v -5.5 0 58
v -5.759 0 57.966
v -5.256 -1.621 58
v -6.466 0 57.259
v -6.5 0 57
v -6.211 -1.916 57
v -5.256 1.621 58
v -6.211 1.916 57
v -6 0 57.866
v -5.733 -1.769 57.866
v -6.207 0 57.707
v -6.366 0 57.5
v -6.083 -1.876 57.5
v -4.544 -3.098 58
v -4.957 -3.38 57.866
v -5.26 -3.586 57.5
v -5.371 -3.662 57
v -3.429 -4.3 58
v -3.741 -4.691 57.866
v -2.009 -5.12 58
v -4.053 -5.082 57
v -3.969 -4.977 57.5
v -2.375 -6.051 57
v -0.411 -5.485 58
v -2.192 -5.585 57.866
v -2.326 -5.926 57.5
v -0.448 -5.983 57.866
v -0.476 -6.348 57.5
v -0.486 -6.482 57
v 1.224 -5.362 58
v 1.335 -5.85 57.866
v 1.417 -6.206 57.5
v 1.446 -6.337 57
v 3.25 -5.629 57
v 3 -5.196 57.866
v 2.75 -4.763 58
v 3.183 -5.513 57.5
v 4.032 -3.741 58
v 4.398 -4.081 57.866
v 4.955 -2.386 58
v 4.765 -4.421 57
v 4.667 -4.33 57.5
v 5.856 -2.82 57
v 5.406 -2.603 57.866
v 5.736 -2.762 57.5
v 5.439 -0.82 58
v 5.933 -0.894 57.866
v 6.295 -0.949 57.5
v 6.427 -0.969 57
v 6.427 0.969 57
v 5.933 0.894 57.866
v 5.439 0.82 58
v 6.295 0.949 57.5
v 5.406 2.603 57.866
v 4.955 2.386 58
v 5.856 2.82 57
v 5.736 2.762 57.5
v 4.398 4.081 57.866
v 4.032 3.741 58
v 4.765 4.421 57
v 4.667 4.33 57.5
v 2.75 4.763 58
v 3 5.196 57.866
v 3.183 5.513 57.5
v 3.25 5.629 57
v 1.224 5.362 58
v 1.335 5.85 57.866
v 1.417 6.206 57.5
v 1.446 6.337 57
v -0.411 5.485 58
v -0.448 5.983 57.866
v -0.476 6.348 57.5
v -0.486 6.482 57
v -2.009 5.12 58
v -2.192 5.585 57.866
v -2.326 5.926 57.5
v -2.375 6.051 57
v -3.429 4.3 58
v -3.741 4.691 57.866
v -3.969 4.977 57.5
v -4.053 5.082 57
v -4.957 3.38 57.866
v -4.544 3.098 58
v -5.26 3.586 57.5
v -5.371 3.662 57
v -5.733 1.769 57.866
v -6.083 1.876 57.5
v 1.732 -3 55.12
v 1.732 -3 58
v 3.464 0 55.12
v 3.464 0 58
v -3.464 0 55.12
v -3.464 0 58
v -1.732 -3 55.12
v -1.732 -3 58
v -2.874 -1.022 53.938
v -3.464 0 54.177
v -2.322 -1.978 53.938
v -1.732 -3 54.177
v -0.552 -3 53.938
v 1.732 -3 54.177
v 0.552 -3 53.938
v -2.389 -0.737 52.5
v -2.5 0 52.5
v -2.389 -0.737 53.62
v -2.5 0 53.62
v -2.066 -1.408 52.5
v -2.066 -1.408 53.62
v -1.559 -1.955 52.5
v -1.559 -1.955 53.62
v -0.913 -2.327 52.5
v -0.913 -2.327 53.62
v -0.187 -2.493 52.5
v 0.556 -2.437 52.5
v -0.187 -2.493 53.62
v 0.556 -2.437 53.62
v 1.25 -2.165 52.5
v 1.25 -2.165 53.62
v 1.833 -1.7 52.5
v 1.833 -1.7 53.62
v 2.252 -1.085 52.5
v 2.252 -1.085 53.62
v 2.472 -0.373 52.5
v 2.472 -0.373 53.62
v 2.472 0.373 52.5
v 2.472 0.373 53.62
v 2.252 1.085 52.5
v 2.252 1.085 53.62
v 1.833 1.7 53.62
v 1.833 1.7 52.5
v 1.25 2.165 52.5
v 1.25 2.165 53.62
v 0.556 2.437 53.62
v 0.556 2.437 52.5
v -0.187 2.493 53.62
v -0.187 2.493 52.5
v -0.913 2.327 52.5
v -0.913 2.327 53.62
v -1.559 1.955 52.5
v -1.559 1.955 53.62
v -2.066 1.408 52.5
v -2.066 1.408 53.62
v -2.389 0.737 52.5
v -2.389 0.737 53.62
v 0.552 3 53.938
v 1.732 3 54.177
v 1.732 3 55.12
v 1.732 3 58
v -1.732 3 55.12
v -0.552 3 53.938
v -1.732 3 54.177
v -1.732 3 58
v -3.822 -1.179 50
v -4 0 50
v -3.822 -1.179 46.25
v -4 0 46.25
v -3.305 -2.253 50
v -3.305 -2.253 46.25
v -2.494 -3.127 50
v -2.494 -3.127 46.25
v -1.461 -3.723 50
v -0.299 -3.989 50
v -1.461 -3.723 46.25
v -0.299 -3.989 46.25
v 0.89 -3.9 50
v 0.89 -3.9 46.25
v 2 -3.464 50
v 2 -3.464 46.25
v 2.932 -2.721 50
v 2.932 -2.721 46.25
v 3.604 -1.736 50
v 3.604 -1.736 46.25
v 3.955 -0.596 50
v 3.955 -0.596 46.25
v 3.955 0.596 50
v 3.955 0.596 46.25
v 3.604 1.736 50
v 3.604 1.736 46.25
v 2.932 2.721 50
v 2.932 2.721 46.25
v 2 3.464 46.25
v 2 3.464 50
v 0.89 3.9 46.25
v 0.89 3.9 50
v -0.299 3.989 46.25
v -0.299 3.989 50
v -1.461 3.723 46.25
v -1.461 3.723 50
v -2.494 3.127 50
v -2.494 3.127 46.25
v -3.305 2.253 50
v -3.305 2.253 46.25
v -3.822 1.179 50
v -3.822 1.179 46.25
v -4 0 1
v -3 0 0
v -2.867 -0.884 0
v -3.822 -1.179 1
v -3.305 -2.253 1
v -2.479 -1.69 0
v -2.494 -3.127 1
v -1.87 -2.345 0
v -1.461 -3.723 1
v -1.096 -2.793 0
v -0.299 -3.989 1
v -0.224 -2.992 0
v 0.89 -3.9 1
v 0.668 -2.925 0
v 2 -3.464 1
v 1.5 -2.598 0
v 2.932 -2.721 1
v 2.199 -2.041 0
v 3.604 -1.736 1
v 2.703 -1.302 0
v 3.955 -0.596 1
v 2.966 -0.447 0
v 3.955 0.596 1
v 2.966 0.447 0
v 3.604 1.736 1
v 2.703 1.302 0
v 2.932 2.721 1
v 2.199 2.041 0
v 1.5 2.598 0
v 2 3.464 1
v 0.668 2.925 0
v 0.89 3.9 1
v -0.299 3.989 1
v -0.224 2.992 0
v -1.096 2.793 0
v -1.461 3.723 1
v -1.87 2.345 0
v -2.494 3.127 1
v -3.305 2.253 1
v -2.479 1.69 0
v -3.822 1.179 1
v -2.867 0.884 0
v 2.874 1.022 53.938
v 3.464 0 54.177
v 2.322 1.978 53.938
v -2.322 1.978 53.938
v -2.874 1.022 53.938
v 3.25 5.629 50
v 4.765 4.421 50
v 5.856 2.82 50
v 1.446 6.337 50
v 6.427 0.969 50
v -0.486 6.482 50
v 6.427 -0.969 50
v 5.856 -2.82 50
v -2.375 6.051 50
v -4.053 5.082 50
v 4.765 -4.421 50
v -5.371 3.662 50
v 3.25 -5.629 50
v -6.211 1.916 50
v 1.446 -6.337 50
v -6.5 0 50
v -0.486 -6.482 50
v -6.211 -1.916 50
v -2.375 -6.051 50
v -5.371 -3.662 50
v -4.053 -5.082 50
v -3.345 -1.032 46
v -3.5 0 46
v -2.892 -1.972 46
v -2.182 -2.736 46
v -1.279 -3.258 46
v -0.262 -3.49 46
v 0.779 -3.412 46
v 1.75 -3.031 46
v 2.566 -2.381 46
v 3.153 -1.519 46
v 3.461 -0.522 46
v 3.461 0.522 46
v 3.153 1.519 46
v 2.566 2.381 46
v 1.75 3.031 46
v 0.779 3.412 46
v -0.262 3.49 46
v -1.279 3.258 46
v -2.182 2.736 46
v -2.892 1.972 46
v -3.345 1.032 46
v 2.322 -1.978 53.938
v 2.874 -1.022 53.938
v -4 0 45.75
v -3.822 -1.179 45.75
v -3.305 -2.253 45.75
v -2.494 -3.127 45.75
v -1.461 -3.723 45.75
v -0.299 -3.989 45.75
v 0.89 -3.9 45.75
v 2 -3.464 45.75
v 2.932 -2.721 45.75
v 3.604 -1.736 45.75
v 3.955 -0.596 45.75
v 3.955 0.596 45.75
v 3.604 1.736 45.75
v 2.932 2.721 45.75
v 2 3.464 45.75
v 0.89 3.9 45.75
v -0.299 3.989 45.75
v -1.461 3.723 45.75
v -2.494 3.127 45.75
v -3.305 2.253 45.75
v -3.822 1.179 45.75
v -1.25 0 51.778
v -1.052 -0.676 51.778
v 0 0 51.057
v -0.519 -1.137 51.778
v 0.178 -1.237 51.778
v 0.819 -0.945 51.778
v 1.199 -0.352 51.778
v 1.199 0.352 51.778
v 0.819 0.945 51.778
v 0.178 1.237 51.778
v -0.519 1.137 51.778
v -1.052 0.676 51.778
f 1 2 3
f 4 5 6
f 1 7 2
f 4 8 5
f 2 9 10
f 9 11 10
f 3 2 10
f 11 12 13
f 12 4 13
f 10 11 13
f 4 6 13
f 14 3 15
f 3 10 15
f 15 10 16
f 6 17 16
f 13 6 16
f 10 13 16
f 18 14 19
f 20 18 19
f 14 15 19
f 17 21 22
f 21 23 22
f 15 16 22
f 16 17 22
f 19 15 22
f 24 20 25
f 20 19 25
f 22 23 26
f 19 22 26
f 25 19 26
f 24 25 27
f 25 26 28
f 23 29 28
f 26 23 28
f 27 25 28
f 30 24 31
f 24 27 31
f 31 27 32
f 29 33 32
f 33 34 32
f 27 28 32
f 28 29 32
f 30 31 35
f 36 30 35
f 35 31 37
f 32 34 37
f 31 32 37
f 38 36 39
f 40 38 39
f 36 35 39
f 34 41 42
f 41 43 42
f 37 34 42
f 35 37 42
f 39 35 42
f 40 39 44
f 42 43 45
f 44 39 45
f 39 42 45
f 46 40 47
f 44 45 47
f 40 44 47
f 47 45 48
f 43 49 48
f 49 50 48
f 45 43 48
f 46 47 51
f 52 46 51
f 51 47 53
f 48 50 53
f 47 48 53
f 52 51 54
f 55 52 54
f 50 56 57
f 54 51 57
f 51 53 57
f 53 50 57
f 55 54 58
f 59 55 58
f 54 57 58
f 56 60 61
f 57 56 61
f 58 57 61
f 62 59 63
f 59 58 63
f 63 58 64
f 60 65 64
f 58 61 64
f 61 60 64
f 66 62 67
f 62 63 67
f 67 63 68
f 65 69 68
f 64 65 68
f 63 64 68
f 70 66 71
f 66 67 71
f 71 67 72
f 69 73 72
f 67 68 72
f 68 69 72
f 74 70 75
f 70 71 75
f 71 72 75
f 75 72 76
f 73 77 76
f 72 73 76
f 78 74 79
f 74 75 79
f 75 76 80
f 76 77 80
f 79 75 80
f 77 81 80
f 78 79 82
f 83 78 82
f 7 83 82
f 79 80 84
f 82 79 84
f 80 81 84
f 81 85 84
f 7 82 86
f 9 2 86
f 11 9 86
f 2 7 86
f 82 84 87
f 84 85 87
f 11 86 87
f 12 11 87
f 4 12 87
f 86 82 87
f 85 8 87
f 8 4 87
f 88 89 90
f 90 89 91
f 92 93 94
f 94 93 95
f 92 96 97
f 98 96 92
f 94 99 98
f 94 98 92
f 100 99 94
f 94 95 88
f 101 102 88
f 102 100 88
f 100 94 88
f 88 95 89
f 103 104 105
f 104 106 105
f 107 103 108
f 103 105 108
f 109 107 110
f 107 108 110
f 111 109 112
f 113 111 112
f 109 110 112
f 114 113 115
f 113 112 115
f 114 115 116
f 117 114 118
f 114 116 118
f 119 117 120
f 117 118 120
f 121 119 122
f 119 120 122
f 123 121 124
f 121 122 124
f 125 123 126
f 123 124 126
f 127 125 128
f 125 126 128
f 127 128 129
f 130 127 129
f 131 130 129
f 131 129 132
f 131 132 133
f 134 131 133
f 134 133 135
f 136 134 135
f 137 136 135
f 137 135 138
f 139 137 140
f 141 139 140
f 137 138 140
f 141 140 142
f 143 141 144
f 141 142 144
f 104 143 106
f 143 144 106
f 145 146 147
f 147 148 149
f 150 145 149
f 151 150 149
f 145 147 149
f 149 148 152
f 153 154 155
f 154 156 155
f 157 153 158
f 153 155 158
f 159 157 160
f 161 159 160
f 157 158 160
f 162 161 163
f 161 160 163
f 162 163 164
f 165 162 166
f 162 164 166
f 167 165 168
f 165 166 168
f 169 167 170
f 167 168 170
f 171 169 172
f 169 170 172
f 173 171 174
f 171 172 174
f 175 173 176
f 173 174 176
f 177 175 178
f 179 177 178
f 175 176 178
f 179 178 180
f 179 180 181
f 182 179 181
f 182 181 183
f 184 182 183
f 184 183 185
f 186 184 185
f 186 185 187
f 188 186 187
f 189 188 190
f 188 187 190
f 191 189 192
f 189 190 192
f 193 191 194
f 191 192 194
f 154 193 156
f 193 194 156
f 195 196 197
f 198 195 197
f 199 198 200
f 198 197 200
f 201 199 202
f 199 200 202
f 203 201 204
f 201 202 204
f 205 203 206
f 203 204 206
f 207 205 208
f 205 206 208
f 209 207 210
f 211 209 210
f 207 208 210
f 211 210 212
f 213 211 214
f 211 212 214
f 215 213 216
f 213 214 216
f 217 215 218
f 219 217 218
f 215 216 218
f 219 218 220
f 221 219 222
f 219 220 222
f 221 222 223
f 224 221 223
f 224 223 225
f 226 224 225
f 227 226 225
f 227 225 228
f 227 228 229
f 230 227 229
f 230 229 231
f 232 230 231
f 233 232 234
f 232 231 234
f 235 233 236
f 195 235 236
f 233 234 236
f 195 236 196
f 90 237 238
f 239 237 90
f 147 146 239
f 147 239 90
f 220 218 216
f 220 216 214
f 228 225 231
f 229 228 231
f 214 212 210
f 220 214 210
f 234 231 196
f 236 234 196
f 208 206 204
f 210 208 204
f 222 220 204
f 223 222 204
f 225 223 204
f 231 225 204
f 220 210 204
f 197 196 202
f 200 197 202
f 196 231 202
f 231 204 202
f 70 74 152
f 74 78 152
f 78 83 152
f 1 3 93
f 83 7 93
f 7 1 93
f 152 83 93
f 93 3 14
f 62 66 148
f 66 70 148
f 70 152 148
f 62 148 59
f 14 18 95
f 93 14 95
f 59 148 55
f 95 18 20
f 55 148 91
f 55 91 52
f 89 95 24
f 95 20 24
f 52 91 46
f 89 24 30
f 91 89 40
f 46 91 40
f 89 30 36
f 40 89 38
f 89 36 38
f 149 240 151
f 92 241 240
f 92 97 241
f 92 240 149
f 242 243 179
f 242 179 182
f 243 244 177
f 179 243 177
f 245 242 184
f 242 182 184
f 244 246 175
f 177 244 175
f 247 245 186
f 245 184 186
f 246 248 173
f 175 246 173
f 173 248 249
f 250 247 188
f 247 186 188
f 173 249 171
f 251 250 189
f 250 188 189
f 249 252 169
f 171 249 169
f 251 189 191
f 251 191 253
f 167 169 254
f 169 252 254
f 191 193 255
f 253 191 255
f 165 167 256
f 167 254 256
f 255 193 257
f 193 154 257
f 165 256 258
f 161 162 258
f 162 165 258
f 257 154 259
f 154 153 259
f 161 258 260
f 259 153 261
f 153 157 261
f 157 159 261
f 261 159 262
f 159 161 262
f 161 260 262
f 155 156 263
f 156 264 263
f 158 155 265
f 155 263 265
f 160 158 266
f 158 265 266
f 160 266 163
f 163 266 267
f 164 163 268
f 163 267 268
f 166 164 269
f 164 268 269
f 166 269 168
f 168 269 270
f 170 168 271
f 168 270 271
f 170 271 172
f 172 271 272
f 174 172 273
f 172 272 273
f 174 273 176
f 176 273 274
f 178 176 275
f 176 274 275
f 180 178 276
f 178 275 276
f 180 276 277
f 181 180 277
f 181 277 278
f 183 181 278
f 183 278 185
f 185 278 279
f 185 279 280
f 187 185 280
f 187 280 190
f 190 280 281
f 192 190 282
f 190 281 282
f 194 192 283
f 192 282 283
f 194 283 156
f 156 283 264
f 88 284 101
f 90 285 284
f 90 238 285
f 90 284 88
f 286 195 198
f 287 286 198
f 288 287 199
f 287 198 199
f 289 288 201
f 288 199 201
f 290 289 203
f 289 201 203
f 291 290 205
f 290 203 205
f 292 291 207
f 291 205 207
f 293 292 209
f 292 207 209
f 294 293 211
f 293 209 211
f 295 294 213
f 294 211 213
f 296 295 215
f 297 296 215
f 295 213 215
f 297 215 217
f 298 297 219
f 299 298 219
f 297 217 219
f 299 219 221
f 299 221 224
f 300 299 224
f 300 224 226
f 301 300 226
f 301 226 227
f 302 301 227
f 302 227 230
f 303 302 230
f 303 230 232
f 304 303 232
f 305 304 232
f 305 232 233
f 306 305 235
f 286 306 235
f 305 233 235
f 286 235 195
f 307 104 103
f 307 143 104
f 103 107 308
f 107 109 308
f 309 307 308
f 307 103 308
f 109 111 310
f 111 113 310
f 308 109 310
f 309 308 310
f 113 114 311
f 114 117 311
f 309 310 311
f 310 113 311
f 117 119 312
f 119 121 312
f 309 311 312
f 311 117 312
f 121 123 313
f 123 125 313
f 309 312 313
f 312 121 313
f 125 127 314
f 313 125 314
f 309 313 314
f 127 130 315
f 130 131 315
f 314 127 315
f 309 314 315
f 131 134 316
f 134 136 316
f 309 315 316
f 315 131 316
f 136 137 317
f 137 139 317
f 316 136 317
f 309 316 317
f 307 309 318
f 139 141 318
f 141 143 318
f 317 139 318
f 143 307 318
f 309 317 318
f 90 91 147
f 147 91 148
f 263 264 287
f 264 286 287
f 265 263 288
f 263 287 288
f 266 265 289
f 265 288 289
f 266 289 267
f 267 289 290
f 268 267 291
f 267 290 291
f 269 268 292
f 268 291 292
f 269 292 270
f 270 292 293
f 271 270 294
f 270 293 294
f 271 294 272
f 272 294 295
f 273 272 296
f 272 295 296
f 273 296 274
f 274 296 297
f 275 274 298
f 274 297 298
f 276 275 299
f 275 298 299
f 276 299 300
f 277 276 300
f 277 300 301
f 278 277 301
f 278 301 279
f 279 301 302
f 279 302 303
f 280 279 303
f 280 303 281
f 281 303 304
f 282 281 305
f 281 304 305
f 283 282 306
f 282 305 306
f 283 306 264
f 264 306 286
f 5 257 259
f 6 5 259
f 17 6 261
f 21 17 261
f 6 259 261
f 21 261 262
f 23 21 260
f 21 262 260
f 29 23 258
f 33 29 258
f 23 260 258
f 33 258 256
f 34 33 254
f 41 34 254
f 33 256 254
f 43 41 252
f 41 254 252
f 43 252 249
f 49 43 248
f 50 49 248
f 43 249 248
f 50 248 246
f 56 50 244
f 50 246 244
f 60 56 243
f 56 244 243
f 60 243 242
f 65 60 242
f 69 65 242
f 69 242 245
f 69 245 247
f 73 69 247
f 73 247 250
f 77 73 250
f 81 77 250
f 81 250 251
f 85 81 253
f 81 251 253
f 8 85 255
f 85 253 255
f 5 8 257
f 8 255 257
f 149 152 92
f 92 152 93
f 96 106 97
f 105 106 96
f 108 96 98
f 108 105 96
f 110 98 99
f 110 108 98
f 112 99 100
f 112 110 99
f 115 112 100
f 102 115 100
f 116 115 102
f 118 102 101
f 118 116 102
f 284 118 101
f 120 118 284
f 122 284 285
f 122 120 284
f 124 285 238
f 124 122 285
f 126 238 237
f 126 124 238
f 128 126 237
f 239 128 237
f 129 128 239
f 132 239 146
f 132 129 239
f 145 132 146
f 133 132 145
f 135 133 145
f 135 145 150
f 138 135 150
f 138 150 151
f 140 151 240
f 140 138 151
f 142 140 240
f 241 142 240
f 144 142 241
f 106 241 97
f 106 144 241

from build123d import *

# Parameters (mm, degrees)
F2_R     = 1
F3_SIZE  = 1
F5_DEPTH = 2.88


# Not quite as in the source:
# - a fillet or chamfer that OpenCascade refuses, or shapes differently, is made with other operations: its cross-section is extruded or revolved along the edge and cut away or added


with BuildPart() as f1:
    # F0 (on Front) → F1 (revolve)
    with BuildSketch(Plane.XZ):
        Polygon((-4, 0), (0, 0), (0, 51.056624327), (-2.5, 52.5), (-2.5, 58), (-6.5, 58), (-6.5, 50), (-4, 50), (-4, 46.25), (-3.5, 46), (-4, 45.75), align=None)
    revolve(axis=Axis((0, 0, 18.332445994), (0, 0, 1)))

    # F2
    f2_edges = [f1.edges().sort_by_distance(p)[0] for p in [
        (6.5, 0, 58),
    ]]
    fillet(f2_edges, radius=F2_R)

    # F3
    f3_edges = [f1.edges().sort_by_distance(p)[0] for p in [
        (4, 0, 0),
    ]]
    chamfer(f3_edges, length=F3_SIZE)

    # F4 (on face) → F5 (cut)
    with BuildSketch(Plane.XY.offset(58)):
        Polygon((-1.7320508076, -3), (1.7320508076, -3), (3.4641016151, 0), (1.7320508076, 3), (-1.7320508076, 3), (-3.4641016151, 0), align=None)
    extrude(amount=-F5_DEPTH, mode=Mode.SUBTRACT)

    # F6: chamfer of 1.5 x 2.5980762114 on 1 edges, made by hand


with BuildPart() as f6_tool2:
    # F6_s3 → F6_t4 (revolve)
    with BuildSketch(Plane.XZ):
        Polygon((-5.0980762114, 55.12), (-2.5, 53.62), (-2.5, 55.12), align=None)
    revolve(axis=Axis((0, 0, 55.12), (0, 0, 1)))

    split(bisect_by=Plane(origin=(-2.5980762114, -1.5, 0), x_dir=(0, 0, 1), z_dir=(0.8660254038, 0.5, 0)), keep=Keep.TOP)

    split(bisect_by=Plane(origin=(-2.5980762114, 1.5, 0), x_dir=(0, 0, 1), z_dir=(0.8660254038, -0.5, 0)), keep=Keep.TOP)

    split(bisect_by=Plane.XZ.offset(-3), keep=Keep.TOP)

    split(bisect_by=Plane(origin=(2.5980762114, 1.5, 0), x_dir=(0, 0, 1), z_dir=(-0.8660254038, -0.5, 0)), keep=Keep.TOP)

    split(bisect_by=Plane(origin=(2.5980762114, -1.5, 0), x_dir=(0, 0, 1), z_dir=(-0.8660254038, 0.5, 0)), keep=Keep.TOP)

    split(bisect_by=Plane.XZ.offset(3), keep=Keep.BOTTOM)


with BuildPart() as f1_1:
    add(f1.part)

    # F6_t1: cut F6_tool2
    add(f6_tool2.part, mode=Mode.SUBTRACT)


solid = f1_1.part
